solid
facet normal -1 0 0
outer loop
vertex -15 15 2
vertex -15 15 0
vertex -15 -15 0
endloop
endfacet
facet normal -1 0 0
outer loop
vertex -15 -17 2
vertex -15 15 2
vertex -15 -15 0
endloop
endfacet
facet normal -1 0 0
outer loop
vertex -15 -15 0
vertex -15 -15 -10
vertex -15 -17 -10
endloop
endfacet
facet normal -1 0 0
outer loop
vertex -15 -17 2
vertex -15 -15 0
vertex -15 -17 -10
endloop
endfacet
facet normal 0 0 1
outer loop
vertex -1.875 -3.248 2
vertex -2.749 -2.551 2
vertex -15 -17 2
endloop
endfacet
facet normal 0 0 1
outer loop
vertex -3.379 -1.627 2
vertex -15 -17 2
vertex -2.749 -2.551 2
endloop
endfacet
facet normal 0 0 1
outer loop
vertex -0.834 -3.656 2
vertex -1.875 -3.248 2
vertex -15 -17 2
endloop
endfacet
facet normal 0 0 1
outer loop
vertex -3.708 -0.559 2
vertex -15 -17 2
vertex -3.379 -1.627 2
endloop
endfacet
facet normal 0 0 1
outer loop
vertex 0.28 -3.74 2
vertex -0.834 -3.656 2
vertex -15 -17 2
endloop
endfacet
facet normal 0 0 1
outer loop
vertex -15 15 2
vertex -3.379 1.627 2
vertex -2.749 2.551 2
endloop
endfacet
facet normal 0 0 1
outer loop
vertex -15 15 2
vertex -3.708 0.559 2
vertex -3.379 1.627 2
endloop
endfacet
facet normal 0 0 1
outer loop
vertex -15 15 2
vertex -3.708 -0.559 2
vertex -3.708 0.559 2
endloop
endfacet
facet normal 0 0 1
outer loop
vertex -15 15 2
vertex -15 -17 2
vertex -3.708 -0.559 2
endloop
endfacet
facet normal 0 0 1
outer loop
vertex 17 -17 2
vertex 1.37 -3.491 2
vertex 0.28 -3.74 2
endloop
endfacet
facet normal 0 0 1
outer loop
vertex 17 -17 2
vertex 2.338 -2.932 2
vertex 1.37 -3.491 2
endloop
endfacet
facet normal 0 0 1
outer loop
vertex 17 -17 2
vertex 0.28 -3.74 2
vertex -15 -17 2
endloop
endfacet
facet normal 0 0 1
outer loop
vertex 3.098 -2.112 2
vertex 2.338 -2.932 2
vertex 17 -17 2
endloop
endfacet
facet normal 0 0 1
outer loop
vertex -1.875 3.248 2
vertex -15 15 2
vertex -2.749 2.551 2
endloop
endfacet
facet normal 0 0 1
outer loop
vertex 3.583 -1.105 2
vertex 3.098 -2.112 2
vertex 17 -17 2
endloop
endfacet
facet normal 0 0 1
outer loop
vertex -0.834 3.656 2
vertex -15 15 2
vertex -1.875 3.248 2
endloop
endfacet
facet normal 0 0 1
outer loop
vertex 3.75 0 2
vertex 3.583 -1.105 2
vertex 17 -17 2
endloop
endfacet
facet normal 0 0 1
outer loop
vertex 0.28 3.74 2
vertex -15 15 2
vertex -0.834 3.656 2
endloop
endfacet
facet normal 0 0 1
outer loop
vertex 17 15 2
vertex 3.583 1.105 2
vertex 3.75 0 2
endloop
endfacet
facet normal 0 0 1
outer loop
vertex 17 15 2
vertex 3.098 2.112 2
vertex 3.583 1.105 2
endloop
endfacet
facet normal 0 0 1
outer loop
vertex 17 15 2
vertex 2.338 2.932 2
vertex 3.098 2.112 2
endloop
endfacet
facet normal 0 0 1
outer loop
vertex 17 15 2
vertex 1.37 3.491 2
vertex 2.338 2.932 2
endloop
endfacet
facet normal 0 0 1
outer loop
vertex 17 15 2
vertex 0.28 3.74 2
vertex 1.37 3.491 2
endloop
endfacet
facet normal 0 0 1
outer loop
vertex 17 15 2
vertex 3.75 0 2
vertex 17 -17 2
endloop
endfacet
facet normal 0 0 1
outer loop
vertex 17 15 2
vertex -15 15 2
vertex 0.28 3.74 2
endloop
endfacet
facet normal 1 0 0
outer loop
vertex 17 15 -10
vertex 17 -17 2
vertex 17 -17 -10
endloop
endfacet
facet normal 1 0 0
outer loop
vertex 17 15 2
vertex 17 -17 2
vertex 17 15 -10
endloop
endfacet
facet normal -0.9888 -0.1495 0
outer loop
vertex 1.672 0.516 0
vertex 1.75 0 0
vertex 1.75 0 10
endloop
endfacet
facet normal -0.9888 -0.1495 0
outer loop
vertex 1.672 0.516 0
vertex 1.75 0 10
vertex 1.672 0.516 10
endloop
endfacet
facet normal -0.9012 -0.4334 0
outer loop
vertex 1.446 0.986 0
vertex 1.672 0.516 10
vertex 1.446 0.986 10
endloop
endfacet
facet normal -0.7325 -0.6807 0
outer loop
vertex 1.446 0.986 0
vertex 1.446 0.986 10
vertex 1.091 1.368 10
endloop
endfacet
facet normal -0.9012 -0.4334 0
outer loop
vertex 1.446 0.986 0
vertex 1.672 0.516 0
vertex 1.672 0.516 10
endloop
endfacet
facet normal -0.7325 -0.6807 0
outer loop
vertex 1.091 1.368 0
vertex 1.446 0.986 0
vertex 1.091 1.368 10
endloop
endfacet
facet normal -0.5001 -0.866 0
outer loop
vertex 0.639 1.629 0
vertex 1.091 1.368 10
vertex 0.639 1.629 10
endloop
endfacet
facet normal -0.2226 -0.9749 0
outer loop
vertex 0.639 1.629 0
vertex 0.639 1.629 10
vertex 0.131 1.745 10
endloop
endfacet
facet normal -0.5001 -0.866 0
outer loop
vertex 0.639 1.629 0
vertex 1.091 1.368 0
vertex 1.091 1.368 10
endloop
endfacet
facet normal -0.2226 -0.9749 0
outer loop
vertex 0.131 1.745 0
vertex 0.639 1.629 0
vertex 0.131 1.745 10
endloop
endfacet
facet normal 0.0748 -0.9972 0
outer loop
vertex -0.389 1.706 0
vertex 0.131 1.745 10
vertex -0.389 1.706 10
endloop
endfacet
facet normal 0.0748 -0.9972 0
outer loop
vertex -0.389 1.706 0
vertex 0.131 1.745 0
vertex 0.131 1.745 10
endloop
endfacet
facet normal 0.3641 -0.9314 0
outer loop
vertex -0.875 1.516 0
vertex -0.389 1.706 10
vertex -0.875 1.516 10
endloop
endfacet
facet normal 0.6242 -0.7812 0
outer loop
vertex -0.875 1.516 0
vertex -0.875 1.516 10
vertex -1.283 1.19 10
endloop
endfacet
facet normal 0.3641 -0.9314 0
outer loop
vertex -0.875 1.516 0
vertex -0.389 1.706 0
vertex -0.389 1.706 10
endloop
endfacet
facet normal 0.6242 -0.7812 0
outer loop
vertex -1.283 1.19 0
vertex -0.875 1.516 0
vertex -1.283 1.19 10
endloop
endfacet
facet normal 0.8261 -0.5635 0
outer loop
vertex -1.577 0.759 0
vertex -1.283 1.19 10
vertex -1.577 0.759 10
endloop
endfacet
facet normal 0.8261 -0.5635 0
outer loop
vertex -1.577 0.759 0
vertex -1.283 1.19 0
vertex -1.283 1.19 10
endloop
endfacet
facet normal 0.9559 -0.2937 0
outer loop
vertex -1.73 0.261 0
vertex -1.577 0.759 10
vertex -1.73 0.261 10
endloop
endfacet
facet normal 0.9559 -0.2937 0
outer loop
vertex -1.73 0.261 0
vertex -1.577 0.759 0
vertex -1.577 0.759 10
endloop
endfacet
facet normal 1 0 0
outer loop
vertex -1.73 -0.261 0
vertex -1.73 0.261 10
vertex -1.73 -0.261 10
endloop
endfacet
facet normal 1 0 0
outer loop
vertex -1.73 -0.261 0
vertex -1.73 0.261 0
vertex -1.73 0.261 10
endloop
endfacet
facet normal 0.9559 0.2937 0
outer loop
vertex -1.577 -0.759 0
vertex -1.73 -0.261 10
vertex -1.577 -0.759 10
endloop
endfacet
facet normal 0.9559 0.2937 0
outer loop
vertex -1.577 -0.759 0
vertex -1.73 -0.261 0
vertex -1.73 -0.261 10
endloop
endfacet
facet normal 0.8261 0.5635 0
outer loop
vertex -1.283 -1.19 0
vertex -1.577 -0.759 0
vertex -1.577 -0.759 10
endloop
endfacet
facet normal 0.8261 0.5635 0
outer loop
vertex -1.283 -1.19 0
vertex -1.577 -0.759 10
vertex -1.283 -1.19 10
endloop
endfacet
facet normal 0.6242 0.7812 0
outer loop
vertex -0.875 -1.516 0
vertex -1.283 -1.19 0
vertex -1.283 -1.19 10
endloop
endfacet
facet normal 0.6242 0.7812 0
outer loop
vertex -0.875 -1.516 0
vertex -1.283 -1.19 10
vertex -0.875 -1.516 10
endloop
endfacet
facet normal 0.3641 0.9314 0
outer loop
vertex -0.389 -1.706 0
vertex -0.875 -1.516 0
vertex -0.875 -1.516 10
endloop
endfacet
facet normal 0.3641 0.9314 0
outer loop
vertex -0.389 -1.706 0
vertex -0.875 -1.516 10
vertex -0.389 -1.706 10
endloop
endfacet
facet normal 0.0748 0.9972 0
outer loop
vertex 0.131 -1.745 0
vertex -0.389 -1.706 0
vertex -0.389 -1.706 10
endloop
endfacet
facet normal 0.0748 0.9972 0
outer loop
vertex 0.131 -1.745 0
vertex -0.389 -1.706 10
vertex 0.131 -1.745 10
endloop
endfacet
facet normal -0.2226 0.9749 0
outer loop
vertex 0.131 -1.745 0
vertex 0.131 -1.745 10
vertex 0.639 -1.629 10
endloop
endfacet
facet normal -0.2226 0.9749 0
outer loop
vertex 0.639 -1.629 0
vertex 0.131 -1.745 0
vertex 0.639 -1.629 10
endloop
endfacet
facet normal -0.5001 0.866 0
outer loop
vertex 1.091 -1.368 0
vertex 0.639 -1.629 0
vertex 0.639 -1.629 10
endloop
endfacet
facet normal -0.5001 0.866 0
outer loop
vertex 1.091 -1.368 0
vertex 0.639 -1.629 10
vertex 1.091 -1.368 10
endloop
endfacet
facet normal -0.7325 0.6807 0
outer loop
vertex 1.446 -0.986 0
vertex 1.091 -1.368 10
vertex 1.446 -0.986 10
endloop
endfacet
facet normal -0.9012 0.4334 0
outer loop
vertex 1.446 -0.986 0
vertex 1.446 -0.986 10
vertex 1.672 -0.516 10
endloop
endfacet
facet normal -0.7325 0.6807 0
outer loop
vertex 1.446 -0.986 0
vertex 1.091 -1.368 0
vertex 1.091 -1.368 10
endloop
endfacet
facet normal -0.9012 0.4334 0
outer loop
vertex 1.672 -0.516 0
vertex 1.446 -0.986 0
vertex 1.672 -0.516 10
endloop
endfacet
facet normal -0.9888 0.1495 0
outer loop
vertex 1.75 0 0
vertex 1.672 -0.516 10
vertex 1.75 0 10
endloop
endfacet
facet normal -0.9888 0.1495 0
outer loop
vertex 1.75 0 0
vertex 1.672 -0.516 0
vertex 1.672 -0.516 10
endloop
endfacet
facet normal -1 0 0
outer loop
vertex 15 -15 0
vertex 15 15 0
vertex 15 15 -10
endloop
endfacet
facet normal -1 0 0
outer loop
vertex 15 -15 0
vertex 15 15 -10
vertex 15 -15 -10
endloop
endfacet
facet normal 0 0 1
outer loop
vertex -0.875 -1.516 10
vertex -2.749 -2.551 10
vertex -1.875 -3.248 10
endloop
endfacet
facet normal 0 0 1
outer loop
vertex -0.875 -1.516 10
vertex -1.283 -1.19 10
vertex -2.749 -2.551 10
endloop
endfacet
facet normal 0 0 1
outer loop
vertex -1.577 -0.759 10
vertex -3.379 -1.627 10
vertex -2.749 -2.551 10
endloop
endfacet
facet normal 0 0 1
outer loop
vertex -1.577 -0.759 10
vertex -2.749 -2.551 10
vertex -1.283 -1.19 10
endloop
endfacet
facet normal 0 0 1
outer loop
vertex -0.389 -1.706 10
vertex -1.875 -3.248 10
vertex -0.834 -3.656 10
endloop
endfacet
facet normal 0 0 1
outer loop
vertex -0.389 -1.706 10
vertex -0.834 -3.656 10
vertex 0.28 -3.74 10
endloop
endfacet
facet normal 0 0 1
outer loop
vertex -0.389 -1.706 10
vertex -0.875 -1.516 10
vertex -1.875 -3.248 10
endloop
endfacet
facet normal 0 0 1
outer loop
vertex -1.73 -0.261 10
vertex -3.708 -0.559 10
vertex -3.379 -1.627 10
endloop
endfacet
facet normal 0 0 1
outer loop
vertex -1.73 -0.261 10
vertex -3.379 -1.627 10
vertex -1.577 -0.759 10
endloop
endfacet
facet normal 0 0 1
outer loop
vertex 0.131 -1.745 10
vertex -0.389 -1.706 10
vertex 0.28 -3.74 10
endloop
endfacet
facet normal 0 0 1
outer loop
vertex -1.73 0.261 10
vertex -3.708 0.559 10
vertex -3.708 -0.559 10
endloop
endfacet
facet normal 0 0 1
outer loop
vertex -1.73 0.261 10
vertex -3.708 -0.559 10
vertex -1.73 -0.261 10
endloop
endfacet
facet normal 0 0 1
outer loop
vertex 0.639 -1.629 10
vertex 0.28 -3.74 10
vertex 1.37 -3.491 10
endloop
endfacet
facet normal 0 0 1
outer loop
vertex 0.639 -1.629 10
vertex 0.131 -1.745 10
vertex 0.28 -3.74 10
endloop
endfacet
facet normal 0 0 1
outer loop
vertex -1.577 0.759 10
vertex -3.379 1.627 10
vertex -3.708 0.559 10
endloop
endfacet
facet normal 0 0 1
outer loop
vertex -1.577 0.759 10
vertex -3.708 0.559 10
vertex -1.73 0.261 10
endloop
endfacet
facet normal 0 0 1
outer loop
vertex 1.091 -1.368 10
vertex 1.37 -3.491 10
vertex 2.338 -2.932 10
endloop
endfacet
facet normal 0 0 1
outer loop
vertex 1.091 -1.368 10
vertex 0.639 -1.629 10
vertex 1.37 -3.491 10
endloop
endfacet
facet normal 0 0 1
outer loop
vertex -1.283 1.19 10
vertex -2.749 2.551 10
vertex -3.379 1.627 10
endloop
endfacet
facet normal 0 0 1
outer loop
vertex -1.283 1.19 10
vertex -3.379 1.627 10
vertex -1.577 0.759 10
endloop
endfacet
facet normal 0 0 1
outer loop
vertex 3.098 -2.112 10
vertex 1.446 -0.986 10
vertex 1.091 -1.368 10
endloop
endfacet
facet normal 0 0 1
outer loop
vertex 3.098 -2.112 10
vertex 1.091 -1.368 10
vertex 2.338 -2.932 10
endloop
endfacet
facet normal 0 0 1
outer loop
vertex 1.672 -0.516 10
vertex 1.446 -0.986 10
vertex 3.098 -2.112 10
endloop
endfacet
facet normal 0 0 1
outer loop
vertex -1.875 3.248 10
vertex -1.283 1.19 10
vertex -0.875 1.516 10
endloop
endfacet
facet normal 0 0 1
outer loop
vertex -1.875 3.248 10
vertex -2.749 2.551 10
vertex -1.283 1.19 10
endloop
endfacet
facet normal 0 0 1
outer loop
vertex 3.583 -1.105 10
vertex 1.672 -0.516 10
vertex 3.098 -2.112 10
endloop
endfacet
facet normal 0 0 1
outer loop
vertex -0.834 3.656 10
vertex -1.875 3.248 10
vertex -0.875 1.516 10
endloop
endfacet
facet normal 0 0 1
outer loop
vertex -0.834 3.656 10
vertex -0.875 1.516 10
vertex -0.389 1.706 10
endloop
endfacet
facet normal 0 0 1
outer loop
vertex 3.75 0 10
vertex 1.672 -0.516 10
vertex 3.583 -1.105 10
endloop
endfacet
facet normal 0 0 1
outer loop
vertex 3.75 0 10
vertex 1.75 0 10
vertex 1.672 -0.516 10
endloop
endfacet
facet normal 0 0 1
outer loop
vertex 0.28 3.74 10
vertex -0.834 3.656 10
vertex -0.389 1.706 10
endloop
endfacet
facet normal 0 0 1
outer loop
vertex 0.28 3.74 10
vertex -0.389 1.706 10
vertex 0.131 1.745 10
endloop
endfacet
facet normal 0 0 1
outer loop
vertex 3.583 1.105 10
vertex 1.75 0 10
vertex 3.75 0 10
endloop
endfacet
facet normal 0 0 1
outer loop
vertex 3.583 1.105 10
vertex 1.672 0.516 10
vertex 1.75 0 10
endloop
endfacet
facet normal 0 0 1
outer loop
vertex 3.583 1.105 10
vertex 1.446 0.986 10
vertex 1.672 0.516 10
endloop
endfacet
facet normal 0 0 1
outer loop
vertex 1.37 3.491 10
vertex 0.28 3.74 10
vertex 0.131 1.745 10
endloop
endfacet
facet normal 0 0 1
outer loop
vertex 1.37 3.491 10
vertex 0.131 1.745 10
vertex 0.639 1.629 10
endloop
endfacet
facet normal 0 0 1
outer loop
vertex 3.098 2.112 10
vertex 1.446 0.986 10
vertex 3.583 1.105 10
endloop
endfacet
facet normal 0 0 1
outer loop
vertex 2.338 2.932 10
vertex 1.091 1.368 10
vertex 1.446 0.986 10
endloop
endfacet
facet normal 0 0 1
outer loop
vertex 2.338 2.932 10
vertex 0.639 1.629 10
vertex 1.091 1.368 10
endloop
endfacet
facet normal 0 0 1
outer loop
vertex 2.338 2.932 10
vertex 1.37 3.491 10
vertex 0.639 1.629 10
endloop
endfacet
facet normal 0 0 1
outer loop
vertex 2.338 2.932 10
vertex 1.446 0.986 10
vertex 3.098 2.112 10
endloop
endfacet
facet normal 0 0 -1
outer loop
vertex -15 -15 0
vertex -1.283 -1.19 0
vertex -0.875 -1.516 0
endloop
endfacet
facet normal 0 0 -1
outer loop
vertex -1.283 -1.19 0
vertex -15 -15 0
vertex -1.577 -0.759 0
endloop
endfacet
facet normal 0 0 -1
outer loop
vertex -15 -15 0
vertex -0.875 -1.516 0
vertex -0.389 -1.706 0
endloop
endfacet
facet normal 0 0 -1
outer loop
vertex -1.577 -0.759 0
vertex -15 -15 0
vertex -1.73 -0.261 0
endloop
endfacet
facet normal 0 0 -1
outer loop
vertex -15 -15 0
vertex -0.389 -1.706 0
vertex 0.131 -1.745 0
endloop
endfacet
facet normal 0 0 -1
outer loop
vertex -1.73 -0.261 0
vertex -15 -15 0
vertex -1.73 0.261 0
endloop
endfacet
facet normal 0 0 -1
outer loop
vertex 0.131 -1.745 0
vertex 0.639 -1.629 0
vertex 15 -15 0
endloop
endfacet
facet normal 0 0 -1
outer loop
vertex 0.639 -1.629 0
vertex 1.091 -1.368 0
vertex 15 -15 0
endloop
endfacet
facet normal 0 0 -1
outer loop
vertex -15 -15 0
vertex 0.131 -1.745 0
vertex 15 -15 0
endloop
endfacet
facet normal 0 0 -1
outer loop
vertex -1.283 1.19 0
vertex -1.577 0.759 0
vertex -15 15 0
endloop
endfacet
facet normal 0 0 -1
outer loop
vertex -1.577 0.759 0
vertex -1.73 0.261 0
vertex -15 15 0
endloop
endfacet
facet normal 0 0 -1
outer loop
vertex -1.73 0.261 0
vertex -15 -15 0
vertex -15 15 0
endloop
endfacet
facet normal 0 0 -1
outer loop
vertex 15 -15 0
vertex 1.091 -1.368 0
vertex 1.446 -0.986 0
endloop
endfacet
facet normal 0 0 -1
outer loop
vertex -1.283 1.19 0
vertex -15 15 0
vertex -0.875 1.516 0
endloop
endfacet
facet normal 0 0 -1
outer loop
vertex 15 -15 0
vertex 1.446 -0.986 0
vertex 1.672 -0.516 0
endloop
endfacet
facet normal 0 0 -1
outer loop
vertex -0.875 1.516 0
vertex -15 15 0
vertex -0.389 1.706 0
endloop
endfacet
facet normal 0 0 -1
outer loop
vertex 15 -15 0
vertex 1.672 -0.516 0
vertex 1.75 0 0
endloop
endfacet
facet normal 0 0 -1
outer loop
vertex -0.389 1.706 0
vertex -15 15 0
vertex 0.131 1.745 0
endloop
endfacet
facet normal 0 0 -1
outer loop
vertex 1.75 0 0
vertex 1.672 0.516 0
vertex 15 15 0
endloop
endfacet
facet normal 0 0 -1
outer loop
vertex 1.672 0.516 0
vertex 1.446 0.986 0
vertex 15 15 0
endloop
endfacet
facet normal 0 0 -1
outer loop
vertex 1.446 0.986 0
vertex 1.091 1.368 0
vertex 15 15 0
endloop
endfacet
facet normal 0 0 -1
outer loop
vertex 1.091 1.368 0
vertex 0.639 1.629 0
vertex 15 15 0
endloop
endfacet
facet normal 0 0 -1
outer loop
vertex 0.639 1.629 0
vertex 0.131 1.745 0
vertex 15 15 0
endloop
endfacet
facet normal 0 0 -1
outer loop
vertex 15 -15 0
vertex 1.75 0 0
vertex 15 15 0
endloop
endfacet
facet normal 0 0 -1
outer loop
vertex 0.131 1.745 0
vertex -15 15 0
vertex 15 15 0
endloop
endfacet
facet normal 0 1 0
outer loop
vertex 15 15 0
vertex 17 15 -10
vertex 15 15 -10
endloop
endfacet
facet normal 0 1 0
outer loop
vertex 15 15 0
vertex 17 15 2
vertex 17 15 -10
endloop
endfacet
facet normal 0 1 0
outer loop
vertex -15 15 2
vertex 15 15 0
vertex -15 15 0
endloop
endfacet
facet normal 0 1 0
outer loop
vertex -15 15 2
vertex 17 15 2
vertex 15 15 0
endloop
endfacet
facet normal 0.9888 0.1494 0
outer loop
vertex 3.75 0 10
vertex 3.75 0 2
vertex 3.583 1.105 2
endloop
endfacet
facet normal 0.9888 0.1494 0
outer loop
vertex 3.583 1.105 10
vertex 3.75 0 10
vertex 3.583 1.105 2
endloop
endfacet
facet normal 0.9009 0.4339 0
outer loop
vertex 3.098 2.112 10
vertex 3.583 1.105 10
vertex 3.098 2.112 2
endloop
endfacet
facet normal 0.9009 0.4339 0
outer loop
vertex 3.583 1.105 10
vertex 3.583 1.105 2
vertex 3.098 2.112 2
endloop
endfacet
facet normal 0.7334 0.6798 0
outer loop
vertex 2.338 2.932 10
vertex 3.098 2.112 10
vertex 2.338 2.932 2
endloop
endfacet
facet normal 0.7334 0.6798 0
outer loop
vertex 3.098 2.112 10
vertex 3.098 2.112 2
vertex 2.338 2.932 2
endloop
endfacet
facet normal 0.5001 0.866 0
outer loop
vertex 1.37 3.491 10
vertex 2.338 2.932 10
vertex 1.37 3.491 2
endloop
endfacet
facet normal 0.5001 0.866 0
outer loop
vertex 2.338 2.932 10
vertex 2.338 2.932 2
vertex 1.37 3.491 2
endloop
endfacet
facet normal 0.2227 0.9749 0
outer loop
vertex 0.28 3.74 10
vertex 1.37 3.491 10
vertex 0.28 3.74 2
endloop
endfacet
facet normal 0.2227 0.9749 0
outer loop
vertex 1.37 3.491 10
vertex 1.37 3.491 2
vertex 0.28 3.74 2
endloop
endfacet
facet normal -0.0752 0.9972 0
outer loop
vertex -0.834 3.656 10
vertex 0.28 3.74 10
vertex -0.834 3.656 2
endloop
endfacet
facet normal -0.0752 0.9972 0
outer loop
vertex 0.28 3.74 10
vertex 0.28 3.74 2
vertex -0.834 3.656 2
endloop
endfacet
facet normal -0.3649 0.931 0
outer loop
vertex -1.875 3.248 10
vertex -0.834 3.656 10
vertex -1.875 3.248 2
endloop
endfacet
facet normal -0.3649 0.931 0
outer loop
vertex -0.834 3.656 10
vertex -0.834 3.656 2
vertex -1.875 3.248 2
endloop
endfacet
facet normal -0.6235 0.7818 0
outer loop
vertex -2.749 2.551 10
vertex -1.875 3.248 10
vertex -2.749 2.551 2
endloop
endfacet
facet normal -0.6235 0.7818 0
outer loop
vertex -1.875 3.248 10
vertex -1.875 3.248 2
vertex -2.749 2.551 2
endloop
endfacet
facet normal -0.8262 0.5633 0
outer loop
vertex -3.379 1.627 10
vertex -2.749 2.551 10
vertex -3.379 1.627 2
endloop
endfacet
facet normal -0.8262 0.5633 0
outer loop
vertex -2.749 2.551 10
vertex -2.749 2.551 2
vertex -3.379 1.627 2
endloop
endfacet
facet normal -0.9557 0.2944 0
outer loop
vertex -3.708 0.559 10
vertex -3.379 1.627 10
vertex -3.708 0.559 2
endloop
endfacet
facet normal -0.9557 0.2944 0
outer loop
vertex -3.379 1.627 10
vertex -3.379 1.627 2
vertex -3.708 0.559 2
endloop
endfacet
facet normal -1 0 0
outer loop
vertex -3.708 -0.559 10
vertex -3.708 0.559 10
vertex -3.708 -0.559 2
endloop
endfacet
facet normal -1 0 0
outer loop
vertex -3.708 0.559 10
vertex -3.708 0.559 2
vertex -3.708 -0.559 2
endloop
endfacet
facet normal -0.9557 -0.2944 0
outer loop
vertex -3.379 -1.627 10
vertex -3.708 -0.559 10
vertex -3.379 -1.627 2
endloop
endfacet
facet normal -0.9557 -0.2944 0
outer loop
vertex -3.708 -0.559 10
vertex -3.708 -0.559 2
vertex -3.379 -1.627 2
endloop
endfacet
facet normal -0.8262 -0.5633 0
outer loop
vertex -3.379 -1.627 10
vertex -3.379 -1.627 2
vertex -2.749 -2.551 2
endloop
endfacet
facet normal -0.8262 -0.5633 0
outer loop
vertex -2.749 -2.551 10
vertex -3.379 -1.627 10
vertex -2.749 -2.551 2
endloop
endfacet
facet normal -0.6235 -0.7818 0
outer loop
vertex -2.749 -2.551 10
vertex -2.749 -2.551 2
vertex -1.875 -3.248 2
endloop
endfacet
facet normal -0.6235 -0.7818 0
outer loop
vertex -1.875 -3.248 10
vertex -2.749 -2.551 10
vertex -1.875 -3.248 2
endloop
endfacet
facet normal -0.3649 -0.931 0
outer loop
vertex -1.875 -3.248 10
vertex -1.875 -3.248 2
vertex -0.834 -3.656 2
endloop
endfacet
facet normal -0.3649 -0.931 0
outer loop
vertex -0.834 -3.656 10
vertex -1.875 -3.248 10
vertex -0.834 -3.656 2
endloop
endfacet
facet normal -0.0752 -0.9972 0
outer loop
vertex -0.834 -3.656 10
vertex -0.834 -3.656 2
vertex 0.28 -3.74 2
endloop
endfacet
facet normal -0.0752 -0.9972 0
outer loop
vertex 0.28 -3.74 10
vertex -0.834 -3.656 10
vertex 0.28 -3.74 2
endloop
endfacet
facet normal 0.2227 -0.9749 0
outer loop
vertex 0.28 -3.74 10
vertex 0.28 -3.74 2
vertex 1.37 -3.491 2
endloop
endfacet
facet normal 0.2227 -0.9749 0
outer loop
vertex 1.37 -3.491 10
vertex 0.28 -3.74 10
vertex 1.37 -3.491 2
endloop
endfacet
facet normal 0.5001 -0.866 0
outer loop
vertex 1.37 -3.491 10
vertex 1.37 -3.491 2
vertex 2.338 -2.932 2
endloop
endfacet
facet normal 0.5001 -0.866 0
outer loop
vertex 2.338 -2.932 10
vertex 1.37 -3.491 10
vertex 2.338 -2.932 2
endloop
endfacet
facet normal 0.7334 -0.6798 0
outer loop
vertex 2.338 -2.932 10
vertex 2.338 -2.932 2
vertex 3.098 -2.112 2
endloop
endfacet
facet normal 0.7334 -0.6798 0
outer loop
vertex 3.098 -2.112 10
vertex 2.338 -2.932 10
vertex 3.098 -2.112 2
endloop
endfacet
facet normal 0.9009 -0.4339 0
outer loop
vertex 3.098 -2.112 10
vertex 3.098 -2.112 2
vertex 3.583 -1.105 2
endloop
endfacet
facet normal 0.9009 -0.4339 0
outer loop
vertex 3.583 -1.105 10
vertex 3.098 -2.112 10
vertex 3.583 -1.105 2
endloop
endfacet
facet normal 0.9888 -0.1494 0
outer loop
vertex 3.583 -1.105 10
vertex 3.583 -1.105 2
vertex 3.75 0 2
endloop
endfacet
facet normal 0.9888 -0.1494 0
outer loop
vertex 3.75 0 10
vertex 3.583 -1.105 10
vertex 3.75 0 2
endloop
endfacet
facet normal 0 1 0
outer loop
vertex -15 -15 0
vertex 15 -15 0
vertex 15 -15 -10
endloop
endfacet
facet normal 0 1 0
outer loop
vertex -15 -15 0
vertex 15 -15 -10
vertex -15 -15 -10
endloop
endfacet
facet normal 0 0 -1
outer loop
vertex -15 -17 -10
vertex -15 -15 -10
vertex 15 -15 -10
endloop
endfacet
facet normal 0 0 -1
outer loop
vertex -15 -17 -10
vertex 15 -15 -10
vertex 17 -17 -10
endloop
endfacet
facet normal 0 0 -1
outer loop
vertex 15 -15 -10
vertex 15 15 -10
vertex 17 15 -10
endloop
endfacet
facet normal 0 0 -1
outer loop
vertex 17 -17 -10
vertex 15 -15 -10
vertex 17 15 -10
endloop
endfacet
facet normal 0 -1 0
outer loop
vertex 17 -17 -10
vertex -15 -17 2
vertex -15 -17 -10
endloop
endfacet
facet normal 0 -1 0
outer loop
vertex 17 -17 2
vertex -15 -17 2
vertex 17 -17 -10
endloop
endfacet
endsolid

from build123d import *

# Parameters (mm, degrees)
F0_R     = 3.75
F0_R_2   = 1.75
F1_DEPTH = 10
F0_W     = 30
F0_H     = 30
F2_DEPTH = 2
F3_DEPTH = 10


with BuildPart() as f1:
    # F0 (on Top) → F1 (new body)
    with BuildSketch(Plane.XY):
        Circle(F0_R)
        Circle(F0_R_2, mode=Mode.SUBTRACT)
    extrude(amount=F1_DEPTH)

    # F0 (on Top) → F2 (join)
    with BuildSketch(Plane.XY):
        Rectangle(F0_W, F0_H)
        Circle(F0_R, mode=Mode.SUBTRACT)
        Polygon((17, 15), (15, 15), (15, -15), (-15, -15), (-15, -17), (17, -17), align=None)
    extrude(amount=F2_DEPTH)

    # F0 (on Top) → F3 (join)
    with BuildSketch(Plane.XY):
        Polygon((17, 15), (15, 15), (15, -15), (-15, -15), (-15, -17), (17, -17), align=None)
    extrude(amount=-F3_DEPTH)


solid = f1.part
